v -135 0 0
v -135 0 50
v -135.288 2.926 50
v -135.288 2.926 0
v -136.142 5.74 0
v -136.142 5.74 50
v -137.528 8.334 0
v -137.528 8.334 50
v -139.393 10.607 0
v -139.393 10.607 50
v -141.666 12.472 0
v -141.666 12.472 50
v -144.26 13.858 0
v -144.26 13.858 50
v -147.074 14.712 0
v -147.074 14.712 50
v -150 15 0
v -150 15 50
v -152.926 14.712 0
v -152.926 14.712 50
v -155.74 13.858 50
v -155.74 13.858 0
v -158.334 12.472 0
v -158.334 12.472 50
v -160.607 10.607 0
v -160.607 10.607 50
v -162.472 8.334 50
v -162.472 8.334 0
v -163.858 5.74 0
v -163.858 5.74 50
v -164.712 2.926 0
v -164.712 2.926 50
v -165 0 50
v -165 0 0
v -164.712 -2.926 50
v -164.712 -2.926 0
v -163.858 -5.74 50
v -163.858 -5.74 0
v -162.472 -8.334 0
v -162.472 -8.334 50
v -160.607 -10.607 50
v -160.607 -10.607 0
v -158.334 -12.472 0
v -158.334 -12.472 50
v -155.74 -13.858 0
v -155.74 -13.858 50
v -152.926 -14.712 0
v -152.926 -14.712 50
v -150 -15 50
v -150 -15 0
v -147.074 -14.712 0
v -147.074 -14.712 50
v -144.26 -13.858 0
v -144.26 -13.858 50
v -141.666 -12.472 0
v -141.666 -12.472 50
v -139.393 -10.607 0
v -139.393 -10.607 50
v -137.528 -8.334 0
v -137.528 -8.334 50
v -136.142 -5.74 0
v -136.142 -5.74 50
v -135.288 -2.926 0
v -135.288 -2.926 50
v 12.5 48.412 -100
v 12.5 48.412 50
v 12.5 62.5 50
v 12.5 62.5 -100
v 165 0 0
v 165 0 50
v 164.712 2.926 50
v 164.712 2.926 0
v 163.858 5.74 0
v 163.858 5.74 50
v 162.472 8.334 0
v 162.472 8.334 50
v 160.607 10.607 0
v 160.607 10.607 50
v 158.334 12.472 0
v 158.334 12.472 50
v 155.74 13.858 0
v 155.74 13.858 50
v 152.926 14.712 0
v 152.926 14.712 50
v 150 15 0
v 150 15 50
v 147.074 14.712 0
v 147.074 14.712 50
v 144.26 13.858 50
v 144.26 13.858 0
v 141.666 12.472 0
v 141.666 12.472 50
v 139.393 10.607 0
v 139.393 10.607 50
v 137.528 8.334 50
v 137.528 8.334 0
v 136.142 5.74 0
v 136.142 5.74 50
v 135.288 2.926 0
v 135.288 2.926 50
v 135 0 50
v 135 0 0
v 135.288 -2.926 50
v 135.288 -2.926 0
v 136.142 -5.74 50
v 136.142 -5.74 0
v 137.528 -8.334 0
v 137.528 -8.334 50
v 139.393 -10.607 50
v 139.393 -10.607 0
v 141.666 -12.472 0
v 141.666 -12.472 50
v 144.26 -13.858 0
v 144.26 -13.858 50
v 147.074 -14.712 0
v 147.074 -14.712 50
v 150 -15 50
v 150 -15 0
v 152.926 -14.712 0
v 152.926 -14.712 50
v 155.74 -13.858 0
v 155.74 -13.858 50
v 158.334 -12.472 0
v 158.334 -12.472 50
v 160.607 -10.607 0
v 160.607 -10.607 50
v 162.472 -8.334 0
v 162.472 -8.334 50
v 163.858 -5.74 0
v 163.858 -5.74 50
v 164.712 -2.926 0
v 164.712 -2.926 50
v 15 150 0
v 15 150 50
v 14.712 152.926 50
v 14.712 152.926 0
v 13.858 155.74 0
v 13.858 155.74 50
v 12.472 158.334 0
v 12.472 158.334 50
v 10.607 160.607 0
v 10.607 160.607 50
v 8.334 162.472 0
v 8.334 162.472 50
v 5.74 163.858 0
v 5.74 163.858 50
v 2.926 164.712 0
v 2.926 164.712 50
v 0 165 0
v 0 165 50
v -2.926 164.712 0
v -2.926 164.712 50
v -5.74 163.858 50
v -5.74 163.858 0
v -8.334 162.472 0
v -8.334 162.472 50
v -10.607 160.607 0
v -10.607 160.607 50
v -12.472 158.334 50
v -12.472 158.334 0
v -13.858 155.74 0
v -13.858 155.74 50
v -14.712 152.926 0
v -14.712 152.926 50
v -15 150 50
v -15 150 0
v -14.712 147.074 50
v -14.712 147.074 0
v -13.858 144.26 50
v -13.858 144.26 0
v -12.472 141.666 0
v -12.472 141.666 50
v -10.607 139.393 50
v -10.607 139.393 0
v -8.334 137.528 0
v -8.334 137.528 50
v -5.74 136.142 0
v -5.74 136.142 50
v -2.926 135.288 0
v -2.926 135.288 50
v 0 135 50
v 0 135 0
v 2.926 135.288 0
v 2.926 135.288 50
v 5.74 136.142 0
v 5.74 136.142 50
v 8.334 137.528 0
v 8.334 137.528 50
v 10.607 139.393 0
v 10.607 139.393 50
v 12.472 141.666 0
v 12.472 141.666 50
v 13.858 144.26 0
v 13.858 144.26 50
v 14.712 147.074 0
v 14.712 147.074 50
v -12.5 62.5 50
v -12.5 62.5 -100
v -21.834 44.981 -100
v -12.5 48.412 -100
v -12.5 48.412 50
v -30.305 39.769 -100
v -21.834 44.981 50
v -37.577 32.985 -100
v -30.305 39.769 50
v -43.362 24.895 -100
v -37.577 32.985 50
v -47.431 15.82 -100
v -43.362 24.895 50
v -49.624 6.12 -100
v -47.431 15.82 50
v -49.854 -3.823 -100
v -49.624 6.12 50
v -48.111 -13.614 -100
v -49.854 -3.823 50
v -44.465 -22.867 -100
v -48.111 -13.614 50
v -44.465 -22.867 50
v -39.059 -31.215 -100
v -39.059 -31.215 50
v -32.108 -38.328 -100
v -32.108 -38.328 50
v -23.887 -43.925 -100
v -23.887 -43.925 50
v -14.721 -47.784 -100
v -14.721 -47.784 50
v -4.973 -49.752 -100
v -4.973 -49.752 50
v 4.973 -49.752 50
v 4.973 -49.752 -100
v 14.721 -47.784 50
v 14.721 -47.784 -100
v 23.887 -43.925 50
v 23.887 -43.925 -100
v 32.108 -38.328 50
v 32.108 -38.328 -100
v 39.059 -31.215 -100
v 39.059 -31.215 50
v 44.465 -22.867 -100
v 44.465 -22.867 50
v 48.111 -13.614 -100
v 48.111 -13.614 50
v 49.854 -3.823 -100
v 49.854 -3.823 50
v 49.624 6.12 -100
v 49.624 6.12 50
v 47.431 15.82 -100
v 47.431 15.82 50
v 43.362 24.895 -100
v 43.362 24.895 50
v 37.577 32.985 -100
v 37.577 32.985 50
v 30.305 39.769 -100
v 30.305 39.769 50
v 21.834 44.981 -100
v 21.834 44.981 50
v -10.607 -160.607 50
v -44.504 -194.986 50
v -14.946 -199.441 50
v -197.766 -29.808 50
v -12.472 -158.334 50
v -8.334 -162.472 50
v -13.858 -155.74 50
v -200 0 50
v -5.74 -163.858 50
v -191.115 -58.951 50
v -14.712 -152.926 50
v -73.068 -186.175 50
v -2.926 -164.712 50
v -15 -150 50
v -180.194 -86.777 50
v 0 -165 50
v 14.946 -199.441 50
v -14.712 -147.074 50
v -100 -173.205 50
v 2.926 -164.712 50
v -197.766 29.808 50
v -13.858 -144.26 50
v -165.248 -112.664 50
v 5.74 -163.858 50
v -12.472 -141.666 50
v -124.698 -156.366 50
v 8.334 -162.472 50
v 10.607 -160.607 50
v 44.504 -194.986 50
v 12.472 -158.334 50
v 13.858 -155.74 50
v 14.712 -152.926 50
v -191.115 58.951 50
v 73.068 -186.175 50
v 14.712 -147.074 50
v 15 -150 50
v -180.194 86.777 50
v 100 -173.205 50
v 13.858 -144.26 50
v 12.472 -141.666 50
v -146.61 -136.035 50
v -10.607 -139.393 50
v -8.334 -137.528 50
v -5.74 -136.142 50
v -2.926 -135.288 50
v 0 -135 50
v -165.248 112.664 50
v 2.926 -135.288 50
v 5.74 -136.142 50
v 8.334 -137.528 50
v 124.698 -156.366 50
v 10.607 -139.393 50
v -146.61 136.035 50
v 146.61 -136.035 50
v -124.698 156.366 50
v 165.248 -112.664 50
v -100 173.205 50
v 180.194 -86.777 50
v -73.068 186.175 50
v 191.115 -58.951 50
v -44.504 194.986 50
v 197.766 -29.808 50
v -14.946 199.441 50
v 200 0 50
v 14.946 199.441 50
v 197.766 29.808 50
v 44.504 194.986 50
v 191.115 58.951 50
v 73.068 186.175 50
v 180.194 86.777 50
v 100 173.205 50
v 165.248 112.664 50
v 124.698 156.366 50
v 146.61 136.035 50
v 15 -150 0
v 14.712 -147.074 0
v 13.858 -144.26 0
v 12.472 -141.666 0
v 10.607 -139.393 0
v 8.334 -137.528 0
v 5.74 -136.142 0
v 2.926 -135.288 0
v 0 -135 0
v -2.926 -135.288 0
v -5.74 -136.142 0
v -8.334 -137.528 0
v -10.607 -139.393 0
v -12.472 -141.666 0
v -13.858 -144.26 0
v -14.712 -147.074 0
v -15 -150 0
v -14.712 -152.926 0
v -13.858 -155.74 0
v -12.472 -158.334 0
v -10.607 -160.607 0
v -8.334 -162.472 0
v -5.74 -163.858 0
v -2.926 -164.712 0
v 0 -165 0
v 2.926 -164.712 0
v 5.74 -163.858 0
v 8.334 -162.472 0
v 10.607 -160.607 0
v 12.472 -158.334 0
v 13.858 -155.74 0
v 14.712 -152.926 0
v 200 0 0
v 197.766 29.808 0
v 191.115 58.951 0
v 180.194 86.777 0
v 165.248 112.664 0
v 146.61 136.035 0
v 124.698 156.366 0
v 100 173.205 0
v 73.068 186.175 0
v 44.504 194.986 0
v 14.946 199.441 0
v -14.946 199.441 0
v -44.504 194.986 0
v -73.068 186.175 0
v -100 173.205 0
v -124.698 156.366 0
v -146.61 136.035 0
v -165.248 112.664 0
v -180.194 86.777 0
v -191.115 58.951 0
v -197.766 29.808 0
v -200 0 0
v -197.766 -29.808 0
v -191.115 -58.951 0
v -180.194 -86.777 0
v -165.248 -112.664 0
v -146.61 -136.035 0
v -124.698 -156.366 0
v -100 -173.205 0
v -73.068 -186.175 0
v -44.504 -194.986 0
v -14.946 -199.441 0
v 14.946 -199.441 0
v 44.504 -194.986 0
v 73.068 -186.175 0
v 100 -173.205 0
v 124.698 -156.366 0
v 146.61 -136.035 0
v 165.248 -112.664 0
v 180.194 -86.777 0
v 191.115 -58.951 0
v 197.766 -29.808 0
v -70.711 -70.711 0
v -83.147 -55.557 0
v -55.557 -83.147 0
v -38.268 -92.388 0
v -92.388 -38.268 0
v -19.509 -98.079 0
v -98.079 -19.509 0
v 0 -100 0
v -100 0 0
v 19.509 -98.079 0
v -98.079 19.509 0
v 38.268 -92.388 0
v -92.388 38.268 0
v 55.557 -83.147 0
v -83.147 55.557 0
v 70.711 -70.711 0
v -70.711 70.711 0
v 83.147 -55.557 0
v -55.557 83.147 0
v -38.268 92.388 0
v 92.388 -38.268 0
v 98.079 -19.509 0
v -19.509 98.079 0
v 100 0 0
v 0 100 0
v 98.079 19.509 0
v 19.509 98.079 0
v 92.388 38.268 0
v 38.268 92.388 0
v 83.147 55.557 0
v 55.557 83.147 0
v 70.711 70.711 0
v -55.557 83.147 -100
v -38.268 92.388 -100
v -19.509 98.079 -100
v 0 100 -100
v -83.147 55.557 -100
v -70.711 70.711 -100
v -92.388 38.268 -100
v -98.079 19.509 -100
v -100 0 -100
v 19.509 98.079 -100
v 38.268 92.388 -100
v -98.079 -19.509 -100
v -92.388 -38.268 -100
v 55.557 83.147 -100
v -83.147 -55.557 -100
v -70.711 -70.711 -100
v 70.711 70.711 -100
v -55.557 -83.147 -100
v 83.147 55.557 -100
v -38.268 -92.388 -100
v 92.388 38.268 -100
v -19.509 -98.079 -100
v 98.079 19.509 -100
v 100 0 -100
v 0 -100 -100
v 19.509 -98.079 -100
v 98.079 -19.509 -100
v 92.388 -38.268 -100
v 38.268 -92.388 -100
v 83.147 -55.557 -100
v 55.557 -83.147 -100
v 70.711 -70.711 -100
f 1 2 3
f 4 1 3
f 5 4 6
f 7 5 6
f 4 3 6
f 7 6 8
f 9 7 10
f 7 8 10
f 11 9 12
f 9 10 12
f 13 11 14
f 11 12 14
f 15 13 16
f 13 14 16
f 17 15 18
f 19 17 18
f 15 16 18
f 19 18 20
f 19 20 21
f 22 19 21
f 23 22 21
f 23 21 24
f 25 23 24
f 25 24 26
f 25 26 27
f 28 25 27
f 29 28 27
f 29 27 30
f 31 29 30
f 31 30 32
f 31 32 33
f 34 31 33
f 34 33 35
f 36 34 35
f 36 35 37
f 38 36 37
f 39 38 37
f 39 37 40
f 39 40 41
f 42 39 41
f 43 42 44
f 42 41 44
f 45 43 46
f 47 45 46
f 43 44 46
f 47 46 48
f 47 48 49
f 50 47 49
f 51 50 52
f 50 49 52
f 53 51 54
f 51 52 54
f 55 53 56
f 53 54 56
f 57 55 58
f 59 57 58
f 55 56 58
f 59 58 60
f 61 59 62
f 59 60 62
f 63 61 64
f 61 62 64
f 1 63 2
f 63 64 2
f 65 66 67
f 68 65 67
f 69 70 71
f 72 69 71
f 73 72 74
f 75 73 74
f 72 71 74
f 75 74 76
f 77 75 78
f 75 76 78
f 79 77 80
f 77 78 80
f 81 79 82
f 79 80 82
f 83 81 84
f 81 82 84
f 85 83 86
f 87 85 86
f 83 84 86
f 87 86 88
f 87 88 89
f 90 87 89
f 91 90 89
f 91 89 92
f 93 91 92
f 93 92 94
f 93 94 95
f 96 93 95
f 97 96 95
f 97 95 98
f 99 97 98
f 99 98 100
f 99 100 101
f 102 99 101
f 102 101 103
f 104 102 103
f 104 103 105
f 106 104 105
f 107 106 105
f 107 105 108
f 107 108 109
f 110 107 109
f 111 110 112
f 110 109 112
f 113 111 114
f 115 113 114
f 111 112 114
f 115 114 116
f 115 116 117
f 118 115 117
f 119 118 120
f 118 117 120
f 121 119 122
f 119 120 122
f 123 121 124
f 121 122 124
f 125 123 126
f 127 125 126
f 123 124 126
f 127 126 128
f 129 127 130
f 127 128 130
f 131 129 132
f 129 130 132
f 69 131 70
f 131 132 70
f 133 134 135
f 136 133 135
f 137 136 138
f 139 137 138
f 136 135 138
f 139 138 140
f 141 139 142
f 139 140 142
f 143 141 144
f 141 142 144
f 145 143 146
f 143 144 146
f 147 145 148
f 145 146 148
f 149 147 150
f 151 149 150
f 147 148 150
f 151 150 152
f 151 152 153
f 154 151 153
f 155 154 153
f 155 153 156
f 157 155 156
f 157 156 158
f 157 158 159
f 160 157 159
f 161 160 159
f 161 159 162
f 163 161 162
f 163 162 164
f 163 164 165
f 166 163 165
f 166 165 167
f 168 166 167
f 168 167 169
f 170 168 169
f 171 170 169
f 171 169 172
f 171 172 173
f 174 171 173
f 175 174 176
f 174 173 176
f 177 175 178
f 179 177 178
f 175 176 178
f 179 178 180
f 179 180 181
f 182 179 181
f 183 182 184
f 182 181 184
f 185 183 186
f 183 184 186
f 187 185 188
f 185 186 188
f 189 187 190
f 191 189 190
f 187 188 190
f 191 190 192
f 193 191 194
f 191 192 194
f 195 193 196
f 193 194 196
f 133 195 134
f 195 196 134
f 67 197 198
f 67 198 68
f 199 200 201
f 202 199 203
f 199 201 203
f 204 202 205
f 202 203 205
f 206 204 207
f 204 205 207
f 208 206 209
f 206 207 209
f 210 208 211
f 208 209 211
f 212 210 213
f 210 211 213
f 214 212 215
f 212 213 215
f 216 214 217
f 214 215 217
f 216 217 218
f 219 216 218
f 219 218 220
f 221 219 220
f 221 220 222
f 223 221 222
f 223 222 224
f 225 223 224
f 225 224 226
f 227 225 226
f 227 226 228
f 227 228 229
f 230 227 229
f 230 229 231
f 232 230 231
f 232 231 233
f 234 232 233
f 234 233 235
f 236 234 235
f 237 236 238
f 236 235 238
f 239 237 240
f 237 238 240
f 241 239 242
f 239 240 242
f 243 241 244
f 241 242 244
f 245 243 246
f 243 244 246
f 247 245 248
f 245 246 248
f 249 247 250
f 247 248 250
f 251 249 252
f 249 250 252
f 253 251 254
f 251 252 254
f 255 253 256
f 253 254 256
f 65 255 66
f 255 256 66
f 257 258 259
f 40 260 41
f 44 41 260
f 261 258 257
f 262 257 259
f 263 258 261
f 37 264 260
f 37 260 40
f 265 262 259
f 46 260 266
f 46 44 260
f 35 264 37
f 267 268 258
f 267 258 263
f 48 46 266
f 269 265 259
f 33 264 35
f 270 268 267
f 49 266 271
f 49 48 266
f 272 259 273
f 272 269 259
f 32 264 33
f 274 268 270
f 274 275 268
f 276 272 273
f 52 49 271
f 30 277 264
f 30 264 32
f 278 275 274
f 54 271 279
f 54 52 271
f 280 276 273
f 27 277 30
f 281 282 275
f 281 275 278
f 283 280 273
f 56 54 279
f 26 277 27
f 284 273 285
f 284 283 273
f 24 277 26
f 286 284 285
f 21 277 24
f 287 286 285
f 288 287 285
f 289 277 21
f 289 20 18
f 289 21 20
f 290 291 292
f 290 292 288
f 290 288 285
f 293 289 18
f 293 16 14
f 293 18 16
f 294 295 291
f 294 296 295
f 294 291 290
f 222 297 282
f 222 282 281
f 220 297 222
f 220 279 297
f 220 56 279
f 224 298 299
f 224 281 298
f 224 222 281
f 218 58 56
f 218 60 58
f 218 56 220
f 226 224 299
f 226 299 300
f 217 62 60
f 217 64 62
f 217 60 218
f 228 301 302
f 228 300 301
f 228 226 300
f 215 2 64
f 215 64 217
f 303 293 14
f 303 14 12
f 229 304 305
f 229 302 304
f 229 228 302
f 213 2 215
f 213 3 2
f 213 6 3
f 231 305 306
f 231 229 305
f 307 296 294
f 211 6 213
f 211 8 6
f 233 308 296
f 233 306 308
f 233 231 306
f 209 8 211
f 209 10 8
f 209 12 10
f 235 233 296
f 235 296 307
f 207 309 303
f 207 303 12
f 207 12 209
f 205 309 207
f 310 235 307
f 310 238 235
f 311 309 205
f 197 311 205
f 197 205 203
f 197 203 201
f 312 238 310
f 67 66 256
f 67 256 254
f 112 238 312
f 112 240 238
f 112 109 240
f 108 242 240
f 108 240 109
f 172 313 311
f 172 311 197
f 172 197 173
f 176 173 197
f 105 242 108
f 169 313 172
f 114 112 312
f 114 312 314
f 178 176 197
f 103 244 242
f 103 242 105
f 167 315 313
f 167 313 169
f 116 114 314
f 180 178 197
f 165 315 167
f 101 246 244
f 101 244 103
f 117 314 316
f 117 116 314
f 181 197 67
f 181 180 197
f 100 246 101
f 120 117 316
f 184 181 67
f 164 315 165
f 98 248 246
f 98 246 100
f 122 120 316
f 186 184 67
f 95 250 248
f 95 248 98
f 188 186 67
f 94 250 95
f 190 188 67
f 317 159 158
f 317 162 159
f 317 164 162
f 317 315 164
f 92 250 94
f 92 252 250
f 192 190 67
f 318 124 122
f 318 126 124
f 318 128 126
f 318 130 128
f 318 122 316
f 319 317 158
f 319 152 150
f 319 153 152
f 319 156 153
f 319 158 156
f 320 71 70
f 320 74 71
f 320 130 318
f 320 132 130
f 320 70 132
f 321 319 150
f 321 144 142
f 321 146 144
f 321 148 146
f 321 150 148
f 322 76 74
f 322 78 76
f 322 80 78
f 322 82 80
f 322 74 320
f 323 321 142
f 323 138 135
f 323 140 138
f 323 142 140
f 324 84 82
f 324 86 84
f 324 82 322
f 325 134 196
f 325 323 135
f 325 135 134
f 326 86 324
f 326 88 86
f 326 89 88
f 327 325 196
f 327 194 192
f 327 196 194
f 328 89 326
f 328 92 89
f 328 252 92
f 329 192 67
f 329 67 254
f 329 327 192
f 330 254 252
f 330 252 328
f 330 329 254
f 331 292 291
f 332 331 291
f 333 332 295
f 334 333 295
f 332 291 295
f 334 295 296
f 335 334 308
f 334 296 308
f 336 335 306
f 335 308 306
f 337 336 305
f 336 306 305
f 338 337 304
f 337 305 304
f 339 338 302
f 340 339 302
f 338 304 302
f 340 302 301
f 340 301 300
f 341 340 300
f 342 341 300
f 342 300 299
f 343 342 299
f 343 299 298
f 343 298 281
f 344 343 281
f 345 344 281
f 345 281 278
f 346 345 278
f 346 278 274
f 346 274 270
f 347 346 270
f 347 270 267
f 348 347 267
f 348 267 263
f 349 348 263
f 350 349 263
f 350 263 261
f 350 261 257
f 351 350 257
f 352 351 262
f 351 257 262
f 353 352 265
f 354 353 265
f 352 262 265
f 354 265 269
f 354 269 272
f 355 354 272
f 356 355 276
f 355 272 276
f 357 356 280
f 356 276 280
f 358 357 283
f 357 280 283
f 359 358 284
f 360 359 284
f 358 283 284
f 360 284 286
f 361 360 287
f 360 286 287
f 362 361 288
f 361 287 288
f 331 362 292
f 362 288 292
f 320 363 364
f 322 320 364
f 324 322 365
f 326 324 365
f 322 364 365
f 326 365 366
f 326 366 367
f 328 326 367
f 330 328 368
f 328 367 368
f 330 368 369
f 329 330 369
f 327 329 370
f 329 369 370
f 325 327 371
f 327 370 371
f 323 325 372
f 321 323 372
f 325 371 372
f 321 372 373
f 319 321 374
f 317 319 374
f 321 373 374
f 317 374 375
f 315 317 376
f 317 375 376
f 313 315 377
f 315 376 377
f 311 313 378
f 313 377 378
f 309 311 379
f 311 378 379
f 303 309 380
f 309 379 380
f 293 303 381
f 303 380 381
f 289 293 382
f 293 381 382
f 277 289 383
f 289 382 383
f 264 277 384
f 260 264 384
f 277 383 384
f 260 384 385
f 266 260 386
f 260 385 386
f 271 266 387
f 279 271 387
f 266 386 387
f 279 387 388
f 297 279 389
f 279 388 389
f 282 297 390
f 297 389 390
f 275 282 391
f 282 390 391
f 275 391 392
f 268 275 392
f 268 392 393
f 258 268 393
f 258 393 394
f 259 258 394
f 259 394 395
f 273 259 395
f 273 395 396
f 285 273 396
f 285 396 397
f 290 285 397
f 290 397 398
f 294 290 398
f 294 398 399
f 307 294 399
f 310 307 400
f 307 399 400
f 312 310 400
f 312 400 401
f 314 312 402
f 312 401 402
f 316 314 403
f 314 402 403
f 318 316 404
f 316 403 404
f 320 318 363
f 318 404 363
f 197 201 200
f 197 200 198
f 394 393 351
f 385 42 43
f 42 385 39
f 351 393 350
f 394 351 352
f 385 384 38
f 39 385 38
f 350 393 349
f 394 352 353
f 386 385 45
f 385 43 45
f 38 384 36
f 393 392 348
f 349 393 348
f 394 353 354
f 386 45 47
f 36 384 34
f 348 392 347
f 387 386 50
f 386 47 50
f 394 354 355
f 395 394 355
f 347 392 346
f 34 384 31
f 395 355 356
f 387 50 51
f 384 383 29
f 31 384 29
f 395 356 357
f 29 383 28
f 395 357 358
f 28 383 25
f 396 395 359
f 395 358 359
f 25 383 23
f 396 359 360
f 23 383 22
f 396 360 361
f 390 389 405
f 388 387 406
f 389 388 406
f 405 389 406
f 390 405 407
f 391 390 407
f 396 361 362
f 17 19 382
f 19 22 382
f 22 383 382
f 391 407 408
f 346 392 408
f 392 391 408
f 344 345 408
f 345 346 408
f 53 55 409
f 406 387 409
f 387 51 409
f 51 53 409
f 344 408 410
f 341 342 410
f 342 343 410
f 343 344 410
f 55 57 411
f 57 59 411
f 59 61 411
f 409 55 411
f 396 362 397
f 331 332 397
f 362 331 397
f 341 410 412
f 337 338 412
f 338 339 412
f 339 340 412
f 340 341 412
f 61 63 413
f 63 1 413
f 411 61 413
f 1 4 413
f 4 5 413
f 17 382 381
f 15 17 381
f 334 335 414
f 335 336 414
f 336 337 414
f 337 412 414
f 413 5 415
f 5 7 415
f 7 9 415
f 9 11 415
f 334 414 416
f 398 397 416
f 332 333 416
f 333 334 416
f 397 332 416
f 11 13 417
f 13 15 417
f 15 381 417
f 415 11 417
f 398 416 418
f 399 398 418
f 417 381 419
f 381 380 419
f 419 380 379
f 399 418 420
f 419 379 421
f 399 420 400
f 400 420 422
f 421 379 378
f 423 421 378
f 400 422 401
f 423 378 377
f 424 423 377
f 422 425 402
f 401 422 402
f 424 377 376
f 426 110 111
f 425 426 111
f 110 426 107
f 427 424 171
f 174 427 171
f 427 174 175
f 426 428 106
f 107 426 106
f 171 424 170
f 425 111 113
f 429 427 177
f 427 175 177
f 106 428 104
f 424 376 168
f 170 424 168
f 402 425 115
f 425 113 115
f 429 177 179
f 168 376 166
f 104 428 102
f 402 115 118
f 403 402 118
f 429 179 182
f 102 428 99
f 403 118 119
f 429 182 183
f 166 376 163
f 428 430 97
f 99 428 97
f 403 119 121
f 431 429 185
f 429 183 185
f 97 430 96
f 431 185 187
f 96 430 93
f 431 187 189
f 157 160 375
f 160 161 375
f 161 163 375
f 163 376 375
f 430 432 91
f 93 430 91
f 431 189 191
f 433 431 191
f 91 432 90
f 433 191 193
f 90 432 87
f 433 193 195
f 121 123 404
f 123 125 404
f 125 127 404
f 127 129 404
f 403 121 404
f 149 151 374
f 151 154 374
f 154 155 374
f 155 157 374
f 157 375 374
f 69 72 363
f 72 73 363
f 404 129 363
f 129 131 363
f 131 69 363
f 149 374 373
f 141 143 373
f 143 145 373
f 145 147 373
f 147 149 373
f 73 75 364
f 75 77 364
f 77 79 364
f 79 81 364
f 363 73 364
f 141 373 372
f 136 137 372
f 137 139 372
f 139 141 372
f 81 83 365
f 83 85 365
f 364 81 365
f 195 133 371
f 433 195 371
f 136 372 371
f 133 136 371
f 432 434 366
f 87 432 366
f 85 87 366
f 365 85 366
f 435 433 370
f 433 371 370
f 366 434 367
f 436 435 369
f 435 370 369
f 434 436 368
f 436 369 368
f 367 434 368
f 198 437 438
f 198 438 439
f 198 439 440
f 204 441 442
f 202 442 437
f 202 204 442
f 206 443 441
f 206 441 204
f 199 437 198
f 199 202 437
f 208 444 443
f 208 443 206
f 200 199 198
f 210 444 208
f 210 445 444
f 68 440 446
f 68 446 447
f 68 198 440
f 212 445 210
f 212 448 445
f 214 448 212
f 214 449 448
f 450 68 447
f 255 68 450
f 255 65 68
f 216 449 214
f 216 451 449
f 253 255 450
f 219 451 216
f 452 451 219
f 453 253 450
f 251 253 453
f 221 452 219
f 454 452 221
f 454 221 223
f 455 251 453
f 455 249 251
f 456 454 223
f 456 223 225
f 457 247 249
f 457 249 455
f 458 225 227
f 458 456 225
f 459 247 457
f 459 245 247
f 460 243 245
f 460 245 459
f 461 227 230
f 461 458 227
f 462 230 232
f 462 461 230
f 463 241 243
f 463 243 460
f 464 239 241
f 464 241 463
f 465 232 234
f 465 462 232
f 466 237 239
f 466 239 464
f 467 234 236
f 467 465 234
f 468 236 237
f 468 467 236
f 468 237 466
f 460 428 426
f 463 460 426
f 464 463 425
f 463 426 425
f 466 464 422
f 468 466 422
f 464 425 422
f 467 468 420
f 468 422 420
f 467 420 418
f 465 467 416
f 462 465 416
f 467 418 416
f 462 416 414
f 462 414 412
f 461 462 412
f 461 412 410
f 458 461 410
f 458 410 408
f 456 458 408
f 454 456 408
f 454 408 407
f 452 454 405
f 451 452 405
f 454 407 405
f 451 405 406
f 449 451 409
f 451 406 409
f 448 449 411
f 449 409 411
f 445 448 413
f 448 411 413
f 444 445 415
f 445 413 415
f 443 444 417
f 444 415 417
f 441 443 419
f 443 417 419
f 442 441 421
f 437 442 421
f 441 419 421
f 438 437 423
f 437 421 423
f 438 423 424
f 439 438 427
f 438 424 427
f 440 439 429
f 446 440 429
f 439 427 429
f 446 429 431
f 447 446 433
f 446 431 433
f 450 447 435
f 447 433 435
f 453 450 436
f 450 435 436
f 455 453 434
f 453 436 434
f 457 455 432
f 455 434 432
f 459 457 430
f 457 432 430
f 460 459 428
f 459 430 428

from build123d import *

# Parameters (mm, degrees)
SKETCH1_R           = 200
BOSS_EXTRUDE1_DEPTH = 50
SKETCH2_R           = 100
BOSS_EXTRUDE2_DEPTH = 100
SKETCH3_R           = 15
CUT_EXTRUDE1_DEPTH  = 321.156211872
SKETCH4_R           = 50
CUT_EXTRUDE2_DEPTH  = 321.156211872
SKETCH5_W           = 25
SKETCH5_H           = 25
CUT_EXTRUDE3_DEPTH  = 321.156211872


with BuildPart() as part:
    # Sketch1 → Boss-Extrude1 (new body)
    with BuildSketch(Plane.XY):
        Circle(SKETCH1_R)
    extrude(amount=BOSS_EXTRUDE1_DEPTH)

    # Sketch2 → Boss-Extrude2 (add)
    with BuildSketch(Plane(origin=(0, 0, 0), x_dir=(-1, 0, 0), z_dir=(0, 0, -1))):
        with Locations(Location((0, 0, 0), (0, 0, 180))):
            Circle(SKETCH2_R)
    extrude(amount=BOSS_EXTRUDE2_DEPTH)

    # Sketch3 → Cut-Extrude1 (cut, through all)
    with BuildSketch(Plane.XY.offset(50)):
        with Locations((0, 150)):
            Circle(SKETCH3_R)
        with Locations((150, 0)):
            Circle(SKETCH3_R)
        with Locations((0, -150)):
            Circle(SKETCH3_R)
        with Locations((-150, 0)):
            Circle(SKETCH3_R)
    extrude(amount=-CUT_EXTRUDE1_DEPTH, mode=Mode.SUBTRACT)

    # Sketch4 → Cut-Extrude2 (cut, through all)
    with BuildSketch(Plane.XY.offset(50)):
        Circle(SKETCH4_R)
    extrude(amount=-CUT_EXTRUDE2_DEPTH, mode=Mode.SUBTRACT)

    # Sketch5 → Cut-Extrude3 (cut, through all)
    with BuildSketch(Plane.XY.offset(50)):
        with Locations((0, 50)):
            Rectangle(SKETCH5_W, SKETCH5_H)
    extrude(amount=-CUT_EXTRUDE3_DEPTH, mode=Mode.SUBTRACT)


solid = part.part
